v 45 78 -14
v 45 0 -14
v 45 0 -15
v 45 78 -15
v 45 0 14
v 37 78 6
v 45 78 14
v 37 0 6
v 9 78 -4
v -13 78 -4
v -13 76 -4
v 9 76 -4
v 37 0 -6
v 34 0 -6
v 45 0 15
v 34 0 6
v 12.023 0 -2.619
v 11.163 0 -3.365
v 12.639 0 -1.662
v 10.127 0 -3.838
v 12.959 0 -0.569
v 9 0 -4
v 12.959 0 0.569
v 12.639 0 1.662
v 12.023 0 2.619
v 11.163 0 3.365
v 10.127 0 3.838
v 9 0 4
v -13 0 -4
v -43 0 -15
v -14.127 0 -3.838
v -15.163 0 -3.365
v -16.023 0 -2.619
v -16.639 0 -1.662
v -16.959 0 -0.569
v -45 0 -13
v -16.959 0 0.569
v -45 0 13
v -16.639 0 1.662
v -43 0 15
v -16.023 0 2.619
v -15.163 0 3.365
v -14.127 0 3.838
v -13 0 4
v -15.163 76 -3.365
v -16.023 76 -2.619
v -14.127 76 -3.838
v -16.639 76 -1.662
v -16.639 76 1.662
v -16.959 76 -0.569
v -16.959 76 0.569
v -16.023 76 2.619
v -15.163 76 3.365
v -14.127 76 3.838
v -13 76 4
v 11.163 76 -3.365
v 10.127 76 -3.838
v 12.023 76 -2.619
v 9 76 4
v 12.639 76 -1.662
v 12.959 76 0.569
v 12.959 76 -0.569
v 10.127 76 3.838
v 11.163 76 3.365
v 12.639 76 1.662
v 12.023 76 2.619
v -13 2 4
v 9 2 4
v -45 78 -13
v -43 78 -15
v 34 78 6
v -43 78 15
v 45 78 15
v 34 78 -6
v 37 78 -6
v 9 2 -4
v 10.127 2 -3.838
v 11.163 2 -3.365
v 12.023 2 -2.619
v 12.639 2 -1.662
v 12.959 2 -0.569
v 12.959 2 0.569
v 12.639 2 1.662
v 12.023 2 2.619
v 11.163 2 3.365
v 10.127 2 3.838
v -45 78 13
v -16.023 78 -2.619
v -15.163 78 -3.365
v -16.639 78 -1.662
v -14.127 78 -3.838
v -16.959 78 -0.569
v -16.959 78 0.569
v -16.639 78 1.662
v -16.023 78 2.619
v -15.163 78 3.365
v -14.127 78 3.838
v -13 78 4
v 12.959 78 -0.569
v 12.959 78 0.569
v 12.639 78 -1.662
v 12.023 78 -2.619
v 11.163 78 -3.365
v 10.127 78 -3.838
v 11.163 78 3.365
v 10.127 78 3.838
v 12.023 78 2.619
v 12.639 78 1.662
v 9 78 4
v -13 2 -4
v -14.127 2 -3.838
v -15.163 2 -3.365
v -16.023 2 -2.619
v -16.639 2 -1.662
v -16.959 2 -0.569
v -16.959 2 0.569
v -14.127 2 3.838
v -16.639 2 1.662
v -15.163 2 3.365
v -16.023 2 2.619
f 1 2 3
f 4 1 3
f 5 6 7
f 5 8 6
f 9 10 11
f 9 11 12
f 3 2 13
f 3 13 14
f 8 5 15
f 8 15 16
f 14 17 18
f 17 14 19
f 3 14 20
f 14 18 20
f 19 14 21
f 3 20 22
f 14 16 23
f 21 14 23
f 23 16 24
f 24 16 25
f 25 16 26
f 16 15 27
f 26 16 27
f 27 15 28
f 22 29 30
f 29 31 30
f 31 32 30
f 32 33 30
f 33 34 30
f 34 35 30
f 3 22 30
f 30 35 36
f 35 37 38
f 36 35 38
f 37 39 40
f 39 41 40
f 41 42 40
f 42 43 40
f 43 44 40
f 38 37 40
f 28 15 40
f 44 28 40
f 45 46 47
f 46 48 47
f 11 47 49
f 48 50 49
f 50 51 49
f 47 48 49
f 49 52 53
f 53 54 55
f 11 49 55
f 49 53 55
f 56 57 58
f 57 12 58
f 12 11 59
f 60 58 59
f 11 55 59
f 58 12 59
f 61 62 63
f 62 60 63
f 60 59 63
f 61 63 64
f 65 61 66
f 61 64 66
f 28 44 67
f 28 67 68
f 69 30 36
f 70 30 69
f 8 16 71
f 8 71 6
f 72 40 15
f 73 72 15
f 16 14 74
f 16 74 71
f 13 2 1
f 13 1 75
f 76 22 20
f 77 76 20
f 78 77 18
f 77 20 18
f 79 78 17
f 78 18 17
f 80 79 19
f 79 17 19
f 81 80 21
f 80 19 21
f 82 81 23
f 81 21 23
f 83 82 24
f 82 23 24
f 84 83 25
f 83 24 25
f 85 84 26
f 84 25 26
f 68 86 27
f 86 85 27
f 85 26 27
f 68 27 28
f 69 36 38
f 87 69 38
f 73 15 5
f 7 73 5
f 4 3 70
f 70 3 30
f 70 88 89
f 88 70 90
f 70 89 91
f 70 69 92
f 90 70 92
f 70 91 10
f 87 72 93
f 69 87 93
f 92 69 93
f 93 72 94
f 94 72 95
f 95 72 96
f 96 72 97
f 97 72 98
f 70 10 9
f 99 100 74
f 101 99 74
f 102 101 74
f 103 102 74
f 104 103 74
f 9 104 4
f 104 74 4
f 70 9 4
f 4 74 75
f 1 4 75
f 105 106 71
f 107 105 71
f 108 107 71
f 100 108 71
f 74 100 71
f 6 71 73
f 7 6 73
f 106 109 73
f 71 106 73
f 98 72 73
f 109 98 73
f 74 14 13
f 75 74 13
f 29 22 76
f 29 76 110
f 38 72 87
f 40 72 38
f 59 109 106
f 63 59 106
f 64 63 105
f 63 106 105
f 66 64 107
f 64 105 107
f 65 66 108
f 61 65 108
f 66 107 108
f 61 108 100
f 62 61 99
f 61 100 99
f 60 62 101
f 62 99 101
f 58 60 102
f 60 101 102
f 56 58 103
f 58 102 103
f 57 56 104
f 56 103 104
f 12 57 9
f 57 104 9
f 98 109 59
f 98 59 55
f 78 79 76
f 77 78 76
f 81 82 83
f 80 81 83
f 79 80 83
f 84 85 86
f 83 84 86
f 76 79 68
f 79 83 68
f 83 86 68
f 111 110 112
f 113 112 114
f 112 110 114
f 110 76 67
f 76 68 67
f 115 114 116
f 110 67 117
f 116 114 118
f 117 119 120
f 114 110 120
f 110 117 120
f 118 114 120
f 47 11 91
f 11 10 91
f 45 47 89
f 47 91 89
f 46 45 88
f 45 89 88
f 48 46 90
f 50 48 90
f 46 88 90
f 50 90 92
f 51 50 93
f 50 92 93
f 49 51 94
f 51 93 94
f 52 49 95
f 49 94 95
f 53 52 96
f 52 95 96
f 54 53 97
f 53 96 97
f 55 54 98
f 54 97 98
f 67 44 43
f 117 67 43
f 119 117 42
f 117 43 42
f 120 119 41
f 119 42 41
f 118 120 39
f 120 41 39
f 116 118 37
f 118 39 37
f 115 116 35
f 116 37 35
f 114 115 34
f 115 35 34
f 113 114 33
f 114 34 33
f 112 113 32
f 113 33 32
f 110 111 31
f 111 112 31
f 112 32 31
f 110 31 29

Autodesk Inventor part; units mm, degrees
ref_plane "YZ Plane" through (0, 0, 0) normal (1, 0, 0) x (0, 1, 0)
ref_plane "XZ Plane" through (0, 0, 0) normal (0, 1, 0) x (-1, 0, 0)
ref_plane "XY Plane" through (0, 0, 0) normal (0, 0, 1) x (1, 0, 0)
sketch "Эскиз1" plane through (0, 0, 0) normal (0, 1, 0) x (-1, 0, 0)
  line L0 (45, 15) -> (-45, 15)
  line L1 (-45, 15) -> (-45, -15)
  line L2 (-45, -15) -> (45, -15)
  line L3 (45, -15) -> (45, 15)
  line L4 (45, 15) -> (-45, -15) construction
  line L5 (-45, 15) -> (45, -15) construction
  line L6 (-45, 15) -> (-9, 15)
  line L7 (-9, 15) -> (-9, 0)
  line L8 (-9, 0) -> (13, 0)
  line L9 (13, 0) -> (-9, 0) construction
  line L10 (-45, -15) -> (-34, -15)
  line L11 (-34, -15) -> (-34, 0)
  line L12 (-34, 0) -> (-34, -6)
  line L13 (-45, -15) -> (-45, -14)
  line L14 (-45, 15) -> (-45, 14)
  line L15 (-45, -14) -> (-28.0294, -14) construction
  line L16 (-34, -6) -> (-37, -6)
  line L17 (-34, 0) -> (-34, 6)
  line L18 (-34, 6) -> (-37, 6)
  line L19 (-37, 6) -> (-45, 14)
  line L20 (-45, -14) -> (-37, -6)
  line L21 (-45, 0) -> (-51.506, 0)
  circle A0 centre (-51, 0) radius 14.1421
  line L22 (-9, 0) -> (13, 0) construction
  line L23 (-9, -4) -> (13, -4)
  line L24 (13, 4) -> (-9, 4)
  arc A1 (-9, 4) -> (-9, -4) centre (-9, 0) ccw
  arc A2 (13, -4) -> (13, 4) centre (13, 0) ccw
  point P0 (0, 0)
  point P1 (2, 0)
  point P2 (2, 0)
  dimension "d0" = 90
  dimension "d1" = 30
  dimension "d2" = 36
  dimension "d3" = 22
  dimension "d7" = 11
  dimension "d8" = 6
  dimension "d9" = 1
  dimension "d10" = 1
  dimension "d12" = 6
  dimension "d13" = 3
  dimension "d14" = 6.506
  dimension "d17" = 8
extrude "Выдавливание1" add sketch "Эскиз1" along normal blind 39 contours L3 L2 L11 L17 L18 L19 L1 L0 | L2 L1 L20 L16 L11 | A1 L24 A2 L23
extrude "Выдавливание2" cut sketch "Эскиз1" along normal blind 2 contours A1 L24 A2 L23
mirror "Зеркальное отражение1" about plane through (0, 39, 0) normal (0, 1, 0) of "Выдавливание2", "Выдавливание1"
chamfer "Фаска1" distance 2 angle 45 2 edges at (-45, 39, -15) (-45, 39, 15)
properties part number "Призма-5"
